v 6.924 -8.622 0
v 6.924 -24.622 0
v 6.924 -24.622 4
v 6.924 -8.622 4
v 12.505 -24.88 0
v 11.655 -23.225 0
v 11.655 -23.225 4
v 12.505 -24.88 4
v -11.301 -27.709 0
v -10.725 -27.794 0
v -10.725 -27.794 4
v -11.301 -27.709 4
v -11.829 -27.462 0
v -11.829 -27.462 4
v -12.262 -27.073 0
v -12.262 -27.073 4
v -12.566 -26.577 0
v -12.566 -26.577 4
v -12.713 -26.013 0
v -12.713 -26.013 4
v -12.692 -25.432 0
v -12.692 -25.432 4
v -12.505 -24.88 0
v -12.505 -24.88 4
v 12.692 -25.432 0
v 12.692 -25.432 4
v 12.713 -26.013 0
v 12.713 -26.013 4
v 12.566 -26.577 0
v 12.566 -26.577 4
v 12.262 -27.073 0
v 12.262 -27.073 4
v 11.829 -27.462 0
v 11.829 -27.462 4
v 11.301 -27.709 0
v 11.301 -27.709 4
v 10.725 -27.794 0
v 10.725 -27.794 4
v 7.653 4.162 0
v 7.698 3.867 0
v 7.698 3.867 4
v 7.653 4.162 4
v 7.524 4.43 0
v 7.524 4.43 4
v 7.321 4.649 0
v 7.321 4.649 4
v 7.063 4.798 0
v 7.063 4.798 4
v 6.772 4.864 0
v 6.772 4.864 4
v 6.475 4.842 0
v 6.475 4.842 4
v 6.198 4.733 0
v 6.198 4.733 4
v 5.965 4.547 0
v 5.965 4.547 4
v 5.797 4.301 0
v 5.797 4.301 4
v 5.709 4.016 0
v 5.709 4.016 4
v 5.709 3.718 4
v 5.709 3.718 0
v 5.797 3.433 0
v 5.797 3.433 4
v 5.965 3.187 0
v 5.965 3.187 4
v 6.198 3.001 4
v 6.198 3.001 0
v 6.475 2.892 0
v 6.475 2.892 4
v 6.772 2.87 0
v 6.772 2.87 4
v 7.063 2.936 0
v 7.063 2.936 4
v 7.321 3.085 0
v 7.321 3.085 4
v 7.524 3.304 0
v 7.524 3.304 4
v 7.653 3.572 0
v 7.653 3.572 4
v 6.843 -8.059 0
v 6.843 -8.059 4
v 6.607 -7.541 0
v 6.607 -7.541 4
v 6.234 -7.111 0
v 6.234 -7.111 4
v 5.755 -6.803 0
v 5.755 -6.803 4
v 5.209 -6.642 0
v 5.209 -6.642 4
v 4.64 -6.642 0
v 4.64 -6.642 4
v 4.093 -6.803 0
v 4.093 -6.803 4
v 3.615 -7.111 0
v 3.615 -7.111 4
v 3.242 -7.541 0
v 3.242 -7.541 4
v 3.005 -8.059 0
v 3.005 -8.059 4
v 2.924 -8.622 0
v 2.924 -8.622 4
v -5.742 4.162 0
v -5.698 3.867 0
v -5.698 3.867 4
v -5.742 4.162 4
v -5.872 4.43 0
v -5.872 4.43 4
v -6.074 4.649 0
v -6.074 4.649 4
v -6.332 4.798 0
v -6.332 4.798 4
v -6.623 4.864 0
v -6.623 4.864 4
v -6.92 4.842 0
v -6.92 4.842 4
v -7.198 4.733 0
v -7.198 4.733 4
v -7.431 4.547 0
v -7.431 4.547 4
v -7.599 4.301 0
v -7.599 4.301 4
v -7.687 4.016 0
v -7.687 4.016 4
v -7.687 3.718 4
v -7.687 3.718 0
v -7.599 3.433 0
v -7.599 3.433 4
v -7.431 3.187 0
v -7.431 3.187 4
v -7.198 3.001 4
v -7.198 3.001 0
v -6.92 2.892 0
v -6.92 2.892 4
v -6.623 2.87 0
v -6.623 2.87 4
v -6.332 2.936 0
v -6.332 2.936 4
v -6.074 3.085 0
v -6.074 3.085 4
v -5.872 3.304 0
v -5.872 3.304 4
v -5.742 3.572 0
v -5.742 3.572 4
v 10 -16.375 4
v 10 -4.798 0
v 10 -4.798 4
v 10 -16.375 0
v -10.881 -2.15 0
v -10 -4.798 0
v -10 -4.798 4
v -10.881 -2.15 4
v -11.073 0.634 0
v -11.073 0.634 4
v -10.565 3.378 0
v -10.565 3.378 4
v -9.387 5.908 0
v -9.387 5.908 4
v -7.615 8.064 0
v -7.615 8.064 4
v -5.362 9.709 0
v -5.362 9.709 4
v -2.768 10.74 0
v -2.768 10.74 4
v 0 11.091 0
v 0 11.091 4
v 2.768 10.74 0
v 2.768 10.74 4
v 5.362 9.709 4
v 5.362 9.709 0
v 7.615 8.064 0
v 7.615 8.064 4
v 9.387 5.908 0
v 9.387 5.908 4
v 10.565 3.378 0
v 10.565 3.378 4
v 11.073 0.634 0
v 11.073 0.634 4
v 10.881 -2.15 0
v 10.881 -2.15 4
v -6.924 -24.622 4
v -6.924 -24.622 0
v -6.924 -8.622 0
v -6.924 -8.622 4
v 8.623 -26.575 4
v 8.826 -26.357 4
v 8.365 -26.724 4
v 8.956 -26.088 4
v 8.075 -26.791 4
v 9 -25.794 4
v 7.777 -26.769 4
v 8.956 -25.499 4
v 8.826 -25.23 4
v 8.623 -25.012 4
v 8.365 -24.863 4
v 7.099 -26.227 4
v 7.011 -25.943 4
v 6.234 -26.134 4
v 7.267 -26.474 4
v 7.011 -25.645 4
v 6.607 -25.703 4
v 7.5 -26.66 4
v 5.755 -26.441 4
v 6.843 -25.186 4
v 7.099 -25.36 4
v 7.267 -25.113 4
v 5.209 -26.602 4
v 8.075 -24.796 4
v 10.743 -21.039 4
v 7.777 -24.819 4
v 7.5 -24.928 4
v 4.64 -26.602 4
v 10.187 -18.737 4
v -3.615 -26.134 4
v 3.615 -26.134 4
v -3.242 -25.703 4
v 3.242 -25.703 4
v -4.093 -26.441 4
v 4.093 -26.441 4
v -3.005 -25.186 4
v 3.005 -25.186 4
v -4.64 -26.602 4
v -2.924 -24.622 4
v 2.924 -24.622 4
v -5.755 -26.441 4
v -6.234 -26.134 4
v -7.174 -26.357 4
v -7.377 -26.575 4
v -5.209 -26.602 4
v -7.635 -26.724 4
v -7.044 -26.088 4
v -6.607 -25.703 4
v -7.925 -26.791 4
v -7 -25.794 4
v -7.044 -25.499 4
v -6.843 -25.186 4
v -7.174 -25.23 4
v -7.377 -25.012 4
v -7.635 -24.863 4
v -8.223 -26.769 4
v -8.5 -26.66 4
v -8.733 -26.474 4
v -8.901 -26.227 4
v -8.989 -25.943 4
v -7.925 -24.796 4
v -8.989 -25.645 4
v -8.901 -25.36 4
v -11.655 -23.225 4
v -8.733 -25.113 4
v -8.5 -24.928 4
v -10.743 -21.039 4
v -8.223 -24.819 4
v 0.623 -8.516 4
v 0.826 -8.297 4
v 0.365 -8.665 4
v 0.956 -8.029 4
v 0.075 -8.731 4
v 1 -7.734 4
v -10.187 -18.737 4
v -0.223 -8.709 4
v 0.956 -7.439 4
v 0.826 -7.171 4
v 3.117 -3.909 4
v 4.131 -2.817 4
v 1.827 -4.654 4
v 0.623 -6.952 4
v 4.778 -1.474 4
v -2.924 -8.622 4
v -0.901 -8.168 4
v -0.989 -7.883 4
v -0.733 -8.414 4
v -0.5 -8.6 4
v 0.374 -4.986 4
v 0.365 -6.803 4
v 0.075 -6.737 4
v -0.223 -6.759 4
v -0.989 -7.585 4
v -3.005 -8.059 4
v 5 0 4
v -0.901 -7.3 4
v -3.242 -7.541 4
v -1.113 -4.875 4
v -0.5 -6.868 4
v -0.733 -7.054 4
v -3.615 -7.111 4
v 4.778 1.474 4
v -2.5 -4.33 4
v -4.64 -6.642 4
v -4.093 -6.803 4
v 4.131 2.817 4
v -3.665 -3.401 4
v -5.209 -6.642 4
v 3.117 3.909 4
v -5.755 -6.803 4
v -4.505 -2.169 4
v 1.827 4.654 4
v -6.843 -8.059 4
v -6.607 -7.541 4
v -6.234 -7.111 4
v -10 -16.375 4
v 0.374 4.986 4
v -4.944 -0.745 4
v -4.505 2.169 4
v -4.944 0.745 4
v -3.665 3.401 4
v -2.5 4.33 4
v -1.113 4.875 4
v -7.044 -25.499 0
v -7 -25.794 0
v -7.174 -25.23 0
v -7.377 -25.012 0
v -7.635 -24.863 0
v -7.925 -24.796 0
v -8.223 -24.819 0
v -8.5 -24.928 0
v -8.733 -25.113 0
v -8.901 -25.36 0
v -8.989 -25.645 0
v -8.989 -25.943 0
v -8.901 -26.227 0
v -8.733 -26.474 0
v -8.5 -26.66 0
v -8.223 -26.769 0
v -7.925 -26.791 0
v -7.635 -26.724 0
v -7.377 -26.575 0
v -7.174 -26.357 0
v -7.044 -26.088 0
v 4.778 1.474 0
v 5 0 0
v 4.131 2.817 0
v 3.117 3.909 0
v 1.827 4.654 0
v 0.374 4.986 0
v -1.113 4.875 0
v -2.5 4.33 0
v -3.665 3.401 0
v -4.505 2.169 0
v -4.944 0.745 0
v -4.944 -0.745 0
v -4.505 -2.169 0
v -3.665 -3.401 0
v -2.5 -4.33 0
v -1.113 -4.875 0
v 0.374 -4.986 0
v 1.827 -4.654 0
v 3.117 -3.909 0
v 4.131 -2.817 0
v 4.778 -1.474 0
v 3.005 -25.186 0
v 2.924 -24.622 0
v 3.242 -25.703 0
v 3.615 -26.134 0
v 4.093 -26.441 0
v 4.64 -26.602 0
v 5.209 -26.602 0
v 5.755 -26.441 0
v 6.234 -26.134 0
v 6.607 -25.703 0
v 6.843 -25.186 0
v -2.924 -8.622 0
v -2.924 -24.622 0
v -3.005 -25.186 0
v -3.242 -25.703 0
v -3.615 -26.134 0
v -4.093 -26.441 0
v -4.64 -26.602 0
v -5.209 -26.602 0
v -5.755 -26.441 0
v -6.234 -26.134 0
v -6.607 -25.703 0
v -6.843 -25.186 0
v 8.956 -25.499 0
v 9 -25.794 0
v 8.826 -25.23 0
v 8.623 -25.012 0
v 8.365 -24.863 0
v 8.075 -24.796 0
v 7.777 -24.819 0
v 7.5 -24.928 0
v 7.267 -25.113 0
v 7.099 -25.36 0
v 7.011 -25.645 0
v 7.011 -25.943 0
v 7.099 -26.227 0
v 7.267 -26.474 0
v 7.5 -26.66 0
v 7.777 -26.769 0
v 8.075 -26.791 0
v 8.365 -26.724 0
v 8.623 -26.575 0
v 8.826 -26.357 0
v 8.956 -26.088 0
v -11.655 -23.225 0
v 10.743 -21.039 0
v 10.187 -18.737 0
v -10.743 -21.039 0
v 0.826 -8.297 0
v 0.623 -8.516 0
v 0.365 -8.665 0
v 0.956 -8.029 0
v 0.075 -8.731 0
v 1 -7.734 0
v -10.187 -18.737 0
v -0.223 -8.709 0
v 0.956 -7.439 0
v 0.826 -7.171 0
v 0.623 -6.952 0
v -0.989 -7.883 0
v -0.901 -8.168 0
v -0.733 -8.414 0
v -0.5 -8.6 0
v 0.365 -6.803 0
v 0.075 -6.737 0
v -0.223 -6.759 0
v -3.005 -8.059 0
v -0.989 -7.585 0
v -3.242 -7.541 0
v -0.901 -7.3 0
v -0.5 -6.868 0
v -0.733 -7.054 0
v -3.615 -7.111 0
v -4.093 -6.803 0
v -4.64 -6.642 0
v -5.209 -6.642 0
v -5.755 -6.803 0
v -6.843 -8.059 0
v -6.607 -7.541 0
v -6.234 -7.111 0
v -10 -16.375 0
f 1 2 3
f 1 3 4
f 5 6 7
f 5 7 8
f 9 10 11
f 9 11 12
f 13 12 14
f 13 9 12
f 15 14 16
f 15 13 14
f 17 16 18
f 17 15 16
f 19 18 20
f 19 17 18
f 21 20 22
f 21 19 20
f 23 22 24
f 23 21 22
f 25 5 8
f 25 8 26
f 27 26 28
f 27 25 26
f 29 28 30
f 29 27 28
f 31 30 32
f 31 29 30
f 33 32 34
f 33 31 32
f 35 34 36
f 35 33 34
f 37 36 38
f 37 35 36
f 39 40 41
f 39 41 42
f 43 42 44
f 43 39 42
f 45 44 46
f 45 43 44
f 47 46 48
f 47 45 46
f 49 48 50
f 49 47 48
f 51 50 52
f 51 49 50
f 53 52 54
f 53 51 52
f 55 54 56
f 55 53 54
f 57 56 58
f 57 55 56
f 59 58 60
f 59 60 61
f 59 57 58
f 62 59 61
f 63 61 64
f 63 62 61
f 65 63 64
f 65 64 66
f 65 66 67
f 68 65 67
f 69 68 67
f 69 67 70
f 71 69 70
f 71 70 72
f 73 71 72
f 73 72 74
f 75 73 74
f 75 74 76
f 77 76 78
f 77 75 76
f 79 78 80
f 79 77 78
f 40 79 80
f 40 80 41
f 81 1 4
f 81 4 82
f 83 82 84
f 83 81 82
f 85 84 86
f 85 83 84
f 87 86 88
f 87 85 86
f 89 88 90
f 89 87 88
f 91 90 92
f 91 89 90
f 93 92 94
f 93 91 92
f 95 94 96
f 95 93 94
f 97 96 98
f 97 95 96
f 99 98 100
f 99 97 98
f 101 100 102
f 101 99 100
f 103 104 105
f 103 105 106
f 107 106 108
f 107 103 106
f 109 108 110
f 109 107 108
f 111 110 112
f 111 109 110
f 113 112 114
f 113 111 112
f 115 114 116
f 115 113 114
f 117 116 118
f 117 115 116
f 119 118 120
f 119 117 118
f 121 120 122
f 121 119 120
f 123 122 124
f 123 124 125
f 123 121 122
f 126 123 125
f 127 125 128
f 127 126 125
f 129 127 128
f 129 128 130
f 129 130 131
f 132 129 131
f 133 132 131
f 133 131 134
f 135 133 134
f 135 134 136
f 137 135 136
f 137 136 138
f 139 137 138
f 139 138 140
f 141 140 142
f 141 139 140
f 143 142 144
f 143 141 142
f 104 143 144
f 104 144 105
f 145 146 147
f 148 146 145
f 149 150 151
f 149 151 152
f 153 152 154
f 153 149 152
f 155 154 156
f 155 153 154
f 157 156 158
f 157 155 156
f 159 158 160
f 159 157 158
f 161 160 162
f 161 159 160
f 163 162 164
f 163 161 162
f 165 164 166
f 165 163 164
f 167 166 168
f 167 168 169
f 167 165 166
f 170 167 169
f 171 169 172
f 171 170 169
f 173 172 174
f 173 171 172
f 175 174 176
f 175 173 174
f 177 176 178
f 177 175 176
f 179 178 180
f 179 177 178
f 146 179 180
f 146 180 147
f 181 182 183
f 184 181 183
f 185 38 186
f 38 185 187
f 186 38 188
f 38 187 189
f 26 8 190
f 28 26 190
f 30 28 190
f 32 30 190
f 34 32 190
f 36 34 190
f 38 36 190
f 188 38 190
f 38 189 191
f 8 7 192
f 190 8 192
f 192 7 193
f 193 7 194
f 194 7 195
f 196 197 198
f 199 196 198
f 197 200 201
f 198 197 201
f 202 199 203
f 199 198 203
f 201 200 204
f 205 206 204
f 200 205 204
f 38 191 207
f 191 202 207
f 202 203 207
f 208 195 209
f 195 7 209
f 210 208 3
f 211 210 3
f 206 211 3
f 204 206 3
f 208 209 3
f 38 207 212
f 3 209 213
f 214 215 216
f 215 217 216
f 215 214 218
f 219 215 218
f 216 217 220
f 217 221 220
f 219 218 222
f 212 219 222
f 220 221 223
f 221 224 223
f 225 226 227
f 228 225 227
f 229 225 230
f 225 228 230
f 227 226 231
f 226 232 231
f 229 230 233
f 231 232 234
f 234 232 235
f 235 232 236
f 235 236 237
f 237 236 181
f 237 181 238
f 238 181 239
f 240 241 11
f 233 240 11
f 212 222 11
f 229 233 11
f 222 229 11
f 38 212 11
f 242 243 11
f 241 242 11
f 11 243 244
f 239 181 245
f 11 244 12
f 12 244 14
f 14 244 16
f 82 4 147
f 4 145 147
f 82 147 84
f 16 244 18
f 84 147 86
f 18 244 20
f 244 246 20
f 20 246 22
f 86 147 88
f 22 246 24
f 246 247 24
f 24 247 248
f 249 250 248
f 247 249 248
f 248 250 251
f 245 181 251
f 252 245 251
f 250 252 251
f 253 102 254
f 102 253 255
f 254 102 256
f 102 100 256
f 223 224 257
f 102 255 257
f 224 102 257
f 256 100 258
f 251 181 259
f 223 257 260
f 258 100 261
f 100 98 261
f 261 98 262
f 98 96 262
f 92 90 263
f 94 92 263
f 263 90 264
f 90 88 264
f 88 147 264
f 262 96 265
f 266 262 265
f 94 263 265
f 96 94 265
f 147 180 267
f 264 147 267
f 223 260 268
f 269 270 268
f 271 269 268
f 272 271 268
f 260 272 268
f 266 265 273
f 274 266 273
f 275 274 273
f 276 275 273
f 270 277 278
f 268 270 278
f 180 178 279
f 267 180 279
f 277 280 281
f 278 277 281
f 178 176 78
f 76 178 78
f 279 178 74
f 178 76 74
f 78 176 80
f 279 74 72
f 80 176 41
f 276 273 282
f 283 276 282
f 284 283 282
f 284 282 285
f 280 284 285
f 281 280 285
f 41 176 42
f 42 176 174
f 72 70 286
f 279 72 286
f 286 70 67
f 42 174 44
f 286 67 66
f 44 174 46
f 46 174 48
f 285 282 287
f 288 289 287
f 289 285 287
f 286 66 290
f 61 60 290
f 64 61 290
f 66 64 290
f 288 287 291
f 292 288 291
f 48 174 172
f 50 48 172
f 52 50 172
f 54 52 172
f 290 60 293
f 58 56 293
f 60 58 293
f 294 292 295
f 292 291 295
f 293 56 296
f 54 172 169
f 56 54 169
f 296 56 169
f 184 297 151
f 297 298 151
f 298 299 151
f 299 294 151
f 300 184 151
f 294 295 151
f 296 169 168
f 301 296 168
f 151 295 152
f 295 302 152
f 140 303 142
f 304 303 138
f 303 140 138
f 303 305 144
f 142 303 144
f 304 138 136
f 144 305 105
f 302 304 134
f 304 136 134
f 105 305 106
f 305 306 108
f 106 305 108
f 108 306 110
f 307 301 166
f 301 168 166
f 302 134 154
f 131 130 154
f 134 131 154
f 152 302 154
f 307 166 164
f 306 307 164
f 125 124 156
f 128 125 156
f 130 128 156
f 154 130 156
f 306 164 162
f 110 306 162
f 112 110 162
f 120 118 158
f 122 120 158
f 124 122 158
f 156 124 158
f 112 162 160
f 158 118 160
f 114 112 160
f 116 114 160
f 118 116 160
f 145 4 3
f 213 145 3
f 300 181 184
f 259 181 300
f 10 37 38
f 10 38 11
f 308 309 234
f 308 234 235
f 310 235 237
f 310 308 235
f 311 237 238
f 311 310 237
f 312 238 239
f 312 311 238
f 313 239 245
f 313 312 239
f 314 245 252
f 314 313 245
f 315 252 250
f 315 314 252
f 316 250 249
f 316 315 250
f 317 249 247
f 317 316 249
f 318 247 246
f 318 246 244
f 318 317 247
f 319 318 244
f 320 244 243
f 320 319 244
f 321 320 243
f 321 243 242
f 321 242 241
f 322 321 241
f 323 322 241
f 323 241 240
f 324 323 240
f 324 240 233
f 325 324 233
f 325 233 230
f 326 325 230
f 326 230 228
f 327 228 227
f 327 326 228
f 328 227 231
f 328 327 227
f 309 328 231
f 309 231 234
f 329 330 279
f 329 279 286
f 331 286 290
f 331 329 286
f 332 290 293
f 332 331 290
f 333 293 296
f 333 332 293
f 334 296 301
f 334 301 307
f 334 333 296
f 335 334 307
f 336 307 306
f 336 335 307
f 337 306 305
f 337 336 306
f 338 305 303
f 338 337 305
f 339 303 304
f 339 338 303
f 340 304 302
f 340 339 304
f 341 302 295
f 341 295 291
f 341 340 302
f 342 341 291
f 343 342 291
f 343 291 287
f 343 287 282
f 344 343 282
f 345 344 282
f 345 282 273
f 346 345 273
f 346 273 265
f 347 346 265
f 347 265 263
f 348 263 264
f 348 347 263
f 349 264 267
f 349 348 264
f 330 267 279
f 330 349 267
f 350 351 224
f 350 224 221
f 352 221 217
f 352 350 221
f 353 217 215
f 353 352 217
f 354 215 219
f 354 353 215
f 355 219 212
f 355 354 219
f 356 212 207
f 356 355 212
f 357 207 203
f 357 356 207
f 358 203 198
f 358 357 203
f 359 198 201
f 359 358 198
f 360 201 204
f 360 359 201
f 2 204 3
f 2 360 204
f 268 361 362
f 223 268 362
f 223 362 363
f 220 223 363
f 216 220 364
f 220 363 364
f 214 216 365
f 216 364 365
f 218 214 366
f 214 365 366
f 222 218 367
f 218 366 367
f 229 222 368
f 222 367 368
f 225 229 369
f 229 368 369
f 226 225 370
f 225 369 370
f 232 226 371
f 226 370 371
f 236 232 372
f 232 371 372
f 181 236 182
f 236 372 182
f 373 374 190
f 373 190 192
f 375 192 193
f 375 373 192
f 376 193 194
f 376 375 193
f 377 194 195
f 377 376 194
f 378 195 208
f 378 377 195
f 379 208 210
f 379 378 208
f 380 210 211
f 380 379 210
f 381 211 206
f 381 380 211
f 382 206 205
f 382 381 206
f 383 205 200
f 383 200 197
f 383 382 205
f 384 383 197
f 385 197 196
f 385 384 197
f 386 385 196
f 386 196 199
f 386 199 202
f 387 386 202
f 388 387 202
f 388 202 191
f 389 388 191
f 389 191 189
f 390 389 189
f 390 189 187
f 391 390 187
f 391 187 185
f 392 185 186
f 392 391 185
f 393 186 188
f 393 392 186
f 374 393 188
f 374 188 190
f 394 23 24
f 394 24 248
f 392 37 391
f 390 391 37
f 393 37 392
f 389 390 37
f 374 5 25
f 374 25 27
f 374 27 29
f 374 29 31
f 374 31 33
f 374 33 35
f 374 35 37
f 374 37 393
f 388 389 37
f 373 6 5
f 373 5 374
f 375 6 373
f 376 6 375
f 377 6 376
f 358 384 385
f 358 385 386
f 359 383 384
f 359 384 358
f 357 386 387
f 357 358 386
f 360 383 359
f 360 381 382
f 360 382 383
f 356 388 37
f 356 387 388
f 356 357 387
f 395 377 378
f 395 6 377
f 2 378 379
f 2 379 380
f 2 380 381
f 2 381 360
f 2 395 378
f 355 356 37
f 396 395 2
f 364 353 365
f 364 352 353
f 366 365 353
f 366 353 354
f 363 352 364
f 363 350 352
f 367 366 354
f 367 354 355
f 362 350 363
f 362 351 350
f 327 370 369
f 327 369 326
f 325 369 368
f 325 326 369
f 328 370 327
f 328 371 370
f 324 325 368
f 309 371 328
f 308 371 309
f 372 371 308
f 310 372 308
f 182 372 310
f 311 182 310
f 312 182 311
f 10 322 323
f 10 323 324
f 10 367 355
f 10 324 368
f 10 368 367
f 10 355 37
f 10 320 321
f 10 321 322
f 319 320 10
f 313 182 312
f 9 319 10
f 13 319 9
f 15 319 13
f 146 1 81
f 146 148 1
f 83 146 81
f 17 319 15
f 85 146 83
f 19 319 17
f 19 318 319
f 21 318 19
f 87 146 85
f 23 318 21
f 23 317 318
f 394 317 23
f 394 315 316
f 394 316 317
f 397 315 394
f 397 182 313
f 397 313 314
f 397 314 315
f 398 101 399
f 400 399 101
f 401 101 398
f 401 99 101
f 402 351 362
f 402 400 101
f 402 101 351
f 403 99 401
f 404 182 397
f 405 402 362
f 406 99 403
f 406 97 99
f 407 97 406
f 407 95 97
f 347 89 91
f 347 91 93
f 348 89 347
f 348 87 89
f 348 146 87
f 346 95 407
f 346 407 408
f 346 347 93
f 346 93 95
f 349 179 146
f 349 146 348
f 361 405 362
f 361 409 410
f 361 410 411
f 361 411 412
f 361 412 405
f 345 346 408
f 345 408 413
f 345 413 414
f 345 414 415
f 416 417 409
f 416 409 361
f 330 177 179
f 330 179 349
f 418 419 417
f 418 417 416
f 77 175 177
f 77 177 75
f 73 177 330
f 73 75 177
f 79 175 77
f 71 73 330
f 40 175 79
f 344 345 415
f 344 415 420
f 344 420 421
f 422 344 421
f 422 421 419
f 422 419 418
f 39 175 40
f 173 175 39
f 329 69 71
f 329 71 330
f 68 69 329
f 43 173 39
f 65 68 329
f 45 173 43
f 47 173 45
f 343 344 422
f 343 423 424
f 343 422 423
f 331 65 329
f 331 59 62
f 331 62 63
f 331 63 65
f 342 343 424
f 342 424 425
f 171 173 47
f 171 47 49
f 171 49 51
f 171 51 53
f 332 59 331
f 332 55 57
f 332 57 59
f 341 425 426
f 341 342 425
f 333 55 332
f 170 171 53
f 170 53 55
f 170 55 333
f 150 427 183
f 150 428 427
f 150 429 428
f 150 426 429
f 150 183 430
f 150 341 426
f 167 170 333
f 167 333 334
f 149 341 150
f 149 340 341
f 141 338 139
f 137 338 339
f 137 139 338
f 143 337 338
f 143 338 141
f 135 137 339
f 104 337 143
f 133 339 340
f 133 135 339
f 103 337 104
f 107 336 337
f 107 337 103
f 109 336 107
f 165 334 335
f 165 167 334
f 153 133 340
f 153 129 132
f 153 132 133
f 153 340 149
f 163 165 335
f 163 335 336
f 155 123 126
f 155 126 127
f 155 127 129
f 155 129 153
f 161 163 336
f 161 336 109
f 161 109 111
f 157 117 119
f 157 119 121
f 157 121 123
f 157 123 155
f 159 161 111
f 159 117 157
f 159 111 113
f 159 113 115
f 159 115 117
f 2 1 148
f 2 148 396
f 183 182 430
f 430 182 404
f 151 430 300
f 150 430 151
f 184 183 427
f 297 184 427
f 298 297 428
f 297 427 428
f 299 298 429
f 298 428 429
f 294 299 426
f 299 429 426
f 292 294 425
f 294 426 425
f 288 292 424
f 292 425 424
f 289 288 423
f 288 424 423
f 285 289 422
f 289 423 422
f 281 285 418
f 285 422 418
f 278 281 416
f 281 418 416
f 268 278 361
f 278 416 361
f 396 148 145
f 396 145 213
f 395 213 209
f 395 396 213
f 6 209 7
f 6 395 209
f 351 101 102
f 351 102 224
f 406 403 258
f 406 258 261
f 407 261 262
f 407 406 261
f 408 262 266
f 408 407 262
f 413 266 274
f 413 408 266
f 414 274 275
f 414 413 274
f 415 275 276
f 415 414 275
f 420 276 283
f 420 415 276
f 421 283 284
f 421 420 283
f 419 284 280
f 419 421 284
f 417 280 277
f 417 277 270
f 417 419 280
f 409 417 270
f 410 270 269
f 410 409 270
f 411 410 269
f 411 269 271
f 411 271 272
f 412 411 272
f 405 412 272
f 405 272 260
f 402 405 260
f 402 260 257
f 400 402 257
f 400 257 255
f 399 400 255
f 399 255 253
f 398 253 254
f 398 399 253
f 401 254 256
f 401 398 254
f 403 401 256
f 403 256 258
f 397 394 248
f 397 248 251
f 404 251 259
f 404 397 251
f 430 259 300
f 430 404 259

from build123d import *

# Parameters (mm, degrees)
SKETCH2_R           = 1
SKETCH2_R_2         = 5
BOSS_EXTRUDE1_DEPTH = 4


with BuildPart() as part:
    # Sketch2 → Boss-Extrude1 (new body)
    with BuildSketch(Plane.XY):
        with BuildLine():
            Line((10, -4.797958971), (10, -16.375449589))
            ThreePointArc((10, -16.375449589), (10.419623267, -19.898603621), (11.655015244, -23.224637999))
            Line((11.655015244, -23.224637999), (12.504814498, -24.880390098))
            ThreePointArc((12.504814498, -24.880390098), (12.432300446, -26.836100173), (10.725483197, -27.793615219))
            Line((10.725483197, -27.793615219), (-10.725483197, -27.793615219))
            ThreePointArc((-10.725483197, -27.793615219), (-12.432300446, -26.836100173), (-12.504814498, -24.880390098))
            Line((-12.504814498, -24.880390098), (-11.655015244, -23.224637999))
            ThreePointArc((-11.655015244, -23.224637999), (-10.419623267, -19.898603621), (-10, -16.375449589))
            Line((-10, -16.375449589), (-10, -4.797958971))
            ThreePointArc((-10, -4.797958971), (0, 11.091456635), (10, -4.797958971))
        make_face()
        with Locations((-8, -25.793615219)):
            Circle(SKETCH2_R, mode=Mode.SUBTRACT)
        with Locations((8, -25.793615219)):
            Circle(SKETCH2_R, mode=Mode.SUBTRACT)
        Circle(SKETCH2_R_2, mode=Mode.SUBTRACT)
        with Locations((0, -7.733897827)):
            Circle(SKETCH2_R, mode=Mode.SUBTRACT)
        with Locations((-6.697751988, 3.866948913)):
            Circle(SKETCH2_R, mode=Mode.SUBTRACT)
        with Locations((6.697751988, 3.866948913)):
            Circle(SKETCH2_R, mode=Mode.SUBTRACT)
        with BuildLine():
            Line((-2.92427416, -8.622098109), (-2.92427416, -24.622098109))
            ThreePointArc((-2.92427416, -24.622098109), (-4.92427416, -26.622098109), (-6.92427416, -24.622098109))
            Line((-6.92427416, -24.622098109), (-6.92427416, -8.622098109))
            ThreePointArc((-6.92427416, -8.622098109), (-4.92427416, -6.622098109), (-2.92427416, -8.622098109))
        make_face(mode=Mode.SUBTRACT)
        with BuildLine():
            Line((2.92427416, -8.622098109), (2.92427416, -24.622098109))
            ThreePointArc((2.92427416, -24.622098109), (4.92427416, -26.622098109), (6.92427416, -24.622098109))
            Line((6.92427416, -24.622098109), (6.92427416, -8.622098109))
            ThreePointArc((6.92427416, -8.622098109), (4.92427416, -6.622098109), (2.92427416, -8.622098109))
        make_face(mode=Mode.SUBTRACT)
    extrude(amount=BOSS_EXTRUDE1_DEPTH)


solid = part.part
